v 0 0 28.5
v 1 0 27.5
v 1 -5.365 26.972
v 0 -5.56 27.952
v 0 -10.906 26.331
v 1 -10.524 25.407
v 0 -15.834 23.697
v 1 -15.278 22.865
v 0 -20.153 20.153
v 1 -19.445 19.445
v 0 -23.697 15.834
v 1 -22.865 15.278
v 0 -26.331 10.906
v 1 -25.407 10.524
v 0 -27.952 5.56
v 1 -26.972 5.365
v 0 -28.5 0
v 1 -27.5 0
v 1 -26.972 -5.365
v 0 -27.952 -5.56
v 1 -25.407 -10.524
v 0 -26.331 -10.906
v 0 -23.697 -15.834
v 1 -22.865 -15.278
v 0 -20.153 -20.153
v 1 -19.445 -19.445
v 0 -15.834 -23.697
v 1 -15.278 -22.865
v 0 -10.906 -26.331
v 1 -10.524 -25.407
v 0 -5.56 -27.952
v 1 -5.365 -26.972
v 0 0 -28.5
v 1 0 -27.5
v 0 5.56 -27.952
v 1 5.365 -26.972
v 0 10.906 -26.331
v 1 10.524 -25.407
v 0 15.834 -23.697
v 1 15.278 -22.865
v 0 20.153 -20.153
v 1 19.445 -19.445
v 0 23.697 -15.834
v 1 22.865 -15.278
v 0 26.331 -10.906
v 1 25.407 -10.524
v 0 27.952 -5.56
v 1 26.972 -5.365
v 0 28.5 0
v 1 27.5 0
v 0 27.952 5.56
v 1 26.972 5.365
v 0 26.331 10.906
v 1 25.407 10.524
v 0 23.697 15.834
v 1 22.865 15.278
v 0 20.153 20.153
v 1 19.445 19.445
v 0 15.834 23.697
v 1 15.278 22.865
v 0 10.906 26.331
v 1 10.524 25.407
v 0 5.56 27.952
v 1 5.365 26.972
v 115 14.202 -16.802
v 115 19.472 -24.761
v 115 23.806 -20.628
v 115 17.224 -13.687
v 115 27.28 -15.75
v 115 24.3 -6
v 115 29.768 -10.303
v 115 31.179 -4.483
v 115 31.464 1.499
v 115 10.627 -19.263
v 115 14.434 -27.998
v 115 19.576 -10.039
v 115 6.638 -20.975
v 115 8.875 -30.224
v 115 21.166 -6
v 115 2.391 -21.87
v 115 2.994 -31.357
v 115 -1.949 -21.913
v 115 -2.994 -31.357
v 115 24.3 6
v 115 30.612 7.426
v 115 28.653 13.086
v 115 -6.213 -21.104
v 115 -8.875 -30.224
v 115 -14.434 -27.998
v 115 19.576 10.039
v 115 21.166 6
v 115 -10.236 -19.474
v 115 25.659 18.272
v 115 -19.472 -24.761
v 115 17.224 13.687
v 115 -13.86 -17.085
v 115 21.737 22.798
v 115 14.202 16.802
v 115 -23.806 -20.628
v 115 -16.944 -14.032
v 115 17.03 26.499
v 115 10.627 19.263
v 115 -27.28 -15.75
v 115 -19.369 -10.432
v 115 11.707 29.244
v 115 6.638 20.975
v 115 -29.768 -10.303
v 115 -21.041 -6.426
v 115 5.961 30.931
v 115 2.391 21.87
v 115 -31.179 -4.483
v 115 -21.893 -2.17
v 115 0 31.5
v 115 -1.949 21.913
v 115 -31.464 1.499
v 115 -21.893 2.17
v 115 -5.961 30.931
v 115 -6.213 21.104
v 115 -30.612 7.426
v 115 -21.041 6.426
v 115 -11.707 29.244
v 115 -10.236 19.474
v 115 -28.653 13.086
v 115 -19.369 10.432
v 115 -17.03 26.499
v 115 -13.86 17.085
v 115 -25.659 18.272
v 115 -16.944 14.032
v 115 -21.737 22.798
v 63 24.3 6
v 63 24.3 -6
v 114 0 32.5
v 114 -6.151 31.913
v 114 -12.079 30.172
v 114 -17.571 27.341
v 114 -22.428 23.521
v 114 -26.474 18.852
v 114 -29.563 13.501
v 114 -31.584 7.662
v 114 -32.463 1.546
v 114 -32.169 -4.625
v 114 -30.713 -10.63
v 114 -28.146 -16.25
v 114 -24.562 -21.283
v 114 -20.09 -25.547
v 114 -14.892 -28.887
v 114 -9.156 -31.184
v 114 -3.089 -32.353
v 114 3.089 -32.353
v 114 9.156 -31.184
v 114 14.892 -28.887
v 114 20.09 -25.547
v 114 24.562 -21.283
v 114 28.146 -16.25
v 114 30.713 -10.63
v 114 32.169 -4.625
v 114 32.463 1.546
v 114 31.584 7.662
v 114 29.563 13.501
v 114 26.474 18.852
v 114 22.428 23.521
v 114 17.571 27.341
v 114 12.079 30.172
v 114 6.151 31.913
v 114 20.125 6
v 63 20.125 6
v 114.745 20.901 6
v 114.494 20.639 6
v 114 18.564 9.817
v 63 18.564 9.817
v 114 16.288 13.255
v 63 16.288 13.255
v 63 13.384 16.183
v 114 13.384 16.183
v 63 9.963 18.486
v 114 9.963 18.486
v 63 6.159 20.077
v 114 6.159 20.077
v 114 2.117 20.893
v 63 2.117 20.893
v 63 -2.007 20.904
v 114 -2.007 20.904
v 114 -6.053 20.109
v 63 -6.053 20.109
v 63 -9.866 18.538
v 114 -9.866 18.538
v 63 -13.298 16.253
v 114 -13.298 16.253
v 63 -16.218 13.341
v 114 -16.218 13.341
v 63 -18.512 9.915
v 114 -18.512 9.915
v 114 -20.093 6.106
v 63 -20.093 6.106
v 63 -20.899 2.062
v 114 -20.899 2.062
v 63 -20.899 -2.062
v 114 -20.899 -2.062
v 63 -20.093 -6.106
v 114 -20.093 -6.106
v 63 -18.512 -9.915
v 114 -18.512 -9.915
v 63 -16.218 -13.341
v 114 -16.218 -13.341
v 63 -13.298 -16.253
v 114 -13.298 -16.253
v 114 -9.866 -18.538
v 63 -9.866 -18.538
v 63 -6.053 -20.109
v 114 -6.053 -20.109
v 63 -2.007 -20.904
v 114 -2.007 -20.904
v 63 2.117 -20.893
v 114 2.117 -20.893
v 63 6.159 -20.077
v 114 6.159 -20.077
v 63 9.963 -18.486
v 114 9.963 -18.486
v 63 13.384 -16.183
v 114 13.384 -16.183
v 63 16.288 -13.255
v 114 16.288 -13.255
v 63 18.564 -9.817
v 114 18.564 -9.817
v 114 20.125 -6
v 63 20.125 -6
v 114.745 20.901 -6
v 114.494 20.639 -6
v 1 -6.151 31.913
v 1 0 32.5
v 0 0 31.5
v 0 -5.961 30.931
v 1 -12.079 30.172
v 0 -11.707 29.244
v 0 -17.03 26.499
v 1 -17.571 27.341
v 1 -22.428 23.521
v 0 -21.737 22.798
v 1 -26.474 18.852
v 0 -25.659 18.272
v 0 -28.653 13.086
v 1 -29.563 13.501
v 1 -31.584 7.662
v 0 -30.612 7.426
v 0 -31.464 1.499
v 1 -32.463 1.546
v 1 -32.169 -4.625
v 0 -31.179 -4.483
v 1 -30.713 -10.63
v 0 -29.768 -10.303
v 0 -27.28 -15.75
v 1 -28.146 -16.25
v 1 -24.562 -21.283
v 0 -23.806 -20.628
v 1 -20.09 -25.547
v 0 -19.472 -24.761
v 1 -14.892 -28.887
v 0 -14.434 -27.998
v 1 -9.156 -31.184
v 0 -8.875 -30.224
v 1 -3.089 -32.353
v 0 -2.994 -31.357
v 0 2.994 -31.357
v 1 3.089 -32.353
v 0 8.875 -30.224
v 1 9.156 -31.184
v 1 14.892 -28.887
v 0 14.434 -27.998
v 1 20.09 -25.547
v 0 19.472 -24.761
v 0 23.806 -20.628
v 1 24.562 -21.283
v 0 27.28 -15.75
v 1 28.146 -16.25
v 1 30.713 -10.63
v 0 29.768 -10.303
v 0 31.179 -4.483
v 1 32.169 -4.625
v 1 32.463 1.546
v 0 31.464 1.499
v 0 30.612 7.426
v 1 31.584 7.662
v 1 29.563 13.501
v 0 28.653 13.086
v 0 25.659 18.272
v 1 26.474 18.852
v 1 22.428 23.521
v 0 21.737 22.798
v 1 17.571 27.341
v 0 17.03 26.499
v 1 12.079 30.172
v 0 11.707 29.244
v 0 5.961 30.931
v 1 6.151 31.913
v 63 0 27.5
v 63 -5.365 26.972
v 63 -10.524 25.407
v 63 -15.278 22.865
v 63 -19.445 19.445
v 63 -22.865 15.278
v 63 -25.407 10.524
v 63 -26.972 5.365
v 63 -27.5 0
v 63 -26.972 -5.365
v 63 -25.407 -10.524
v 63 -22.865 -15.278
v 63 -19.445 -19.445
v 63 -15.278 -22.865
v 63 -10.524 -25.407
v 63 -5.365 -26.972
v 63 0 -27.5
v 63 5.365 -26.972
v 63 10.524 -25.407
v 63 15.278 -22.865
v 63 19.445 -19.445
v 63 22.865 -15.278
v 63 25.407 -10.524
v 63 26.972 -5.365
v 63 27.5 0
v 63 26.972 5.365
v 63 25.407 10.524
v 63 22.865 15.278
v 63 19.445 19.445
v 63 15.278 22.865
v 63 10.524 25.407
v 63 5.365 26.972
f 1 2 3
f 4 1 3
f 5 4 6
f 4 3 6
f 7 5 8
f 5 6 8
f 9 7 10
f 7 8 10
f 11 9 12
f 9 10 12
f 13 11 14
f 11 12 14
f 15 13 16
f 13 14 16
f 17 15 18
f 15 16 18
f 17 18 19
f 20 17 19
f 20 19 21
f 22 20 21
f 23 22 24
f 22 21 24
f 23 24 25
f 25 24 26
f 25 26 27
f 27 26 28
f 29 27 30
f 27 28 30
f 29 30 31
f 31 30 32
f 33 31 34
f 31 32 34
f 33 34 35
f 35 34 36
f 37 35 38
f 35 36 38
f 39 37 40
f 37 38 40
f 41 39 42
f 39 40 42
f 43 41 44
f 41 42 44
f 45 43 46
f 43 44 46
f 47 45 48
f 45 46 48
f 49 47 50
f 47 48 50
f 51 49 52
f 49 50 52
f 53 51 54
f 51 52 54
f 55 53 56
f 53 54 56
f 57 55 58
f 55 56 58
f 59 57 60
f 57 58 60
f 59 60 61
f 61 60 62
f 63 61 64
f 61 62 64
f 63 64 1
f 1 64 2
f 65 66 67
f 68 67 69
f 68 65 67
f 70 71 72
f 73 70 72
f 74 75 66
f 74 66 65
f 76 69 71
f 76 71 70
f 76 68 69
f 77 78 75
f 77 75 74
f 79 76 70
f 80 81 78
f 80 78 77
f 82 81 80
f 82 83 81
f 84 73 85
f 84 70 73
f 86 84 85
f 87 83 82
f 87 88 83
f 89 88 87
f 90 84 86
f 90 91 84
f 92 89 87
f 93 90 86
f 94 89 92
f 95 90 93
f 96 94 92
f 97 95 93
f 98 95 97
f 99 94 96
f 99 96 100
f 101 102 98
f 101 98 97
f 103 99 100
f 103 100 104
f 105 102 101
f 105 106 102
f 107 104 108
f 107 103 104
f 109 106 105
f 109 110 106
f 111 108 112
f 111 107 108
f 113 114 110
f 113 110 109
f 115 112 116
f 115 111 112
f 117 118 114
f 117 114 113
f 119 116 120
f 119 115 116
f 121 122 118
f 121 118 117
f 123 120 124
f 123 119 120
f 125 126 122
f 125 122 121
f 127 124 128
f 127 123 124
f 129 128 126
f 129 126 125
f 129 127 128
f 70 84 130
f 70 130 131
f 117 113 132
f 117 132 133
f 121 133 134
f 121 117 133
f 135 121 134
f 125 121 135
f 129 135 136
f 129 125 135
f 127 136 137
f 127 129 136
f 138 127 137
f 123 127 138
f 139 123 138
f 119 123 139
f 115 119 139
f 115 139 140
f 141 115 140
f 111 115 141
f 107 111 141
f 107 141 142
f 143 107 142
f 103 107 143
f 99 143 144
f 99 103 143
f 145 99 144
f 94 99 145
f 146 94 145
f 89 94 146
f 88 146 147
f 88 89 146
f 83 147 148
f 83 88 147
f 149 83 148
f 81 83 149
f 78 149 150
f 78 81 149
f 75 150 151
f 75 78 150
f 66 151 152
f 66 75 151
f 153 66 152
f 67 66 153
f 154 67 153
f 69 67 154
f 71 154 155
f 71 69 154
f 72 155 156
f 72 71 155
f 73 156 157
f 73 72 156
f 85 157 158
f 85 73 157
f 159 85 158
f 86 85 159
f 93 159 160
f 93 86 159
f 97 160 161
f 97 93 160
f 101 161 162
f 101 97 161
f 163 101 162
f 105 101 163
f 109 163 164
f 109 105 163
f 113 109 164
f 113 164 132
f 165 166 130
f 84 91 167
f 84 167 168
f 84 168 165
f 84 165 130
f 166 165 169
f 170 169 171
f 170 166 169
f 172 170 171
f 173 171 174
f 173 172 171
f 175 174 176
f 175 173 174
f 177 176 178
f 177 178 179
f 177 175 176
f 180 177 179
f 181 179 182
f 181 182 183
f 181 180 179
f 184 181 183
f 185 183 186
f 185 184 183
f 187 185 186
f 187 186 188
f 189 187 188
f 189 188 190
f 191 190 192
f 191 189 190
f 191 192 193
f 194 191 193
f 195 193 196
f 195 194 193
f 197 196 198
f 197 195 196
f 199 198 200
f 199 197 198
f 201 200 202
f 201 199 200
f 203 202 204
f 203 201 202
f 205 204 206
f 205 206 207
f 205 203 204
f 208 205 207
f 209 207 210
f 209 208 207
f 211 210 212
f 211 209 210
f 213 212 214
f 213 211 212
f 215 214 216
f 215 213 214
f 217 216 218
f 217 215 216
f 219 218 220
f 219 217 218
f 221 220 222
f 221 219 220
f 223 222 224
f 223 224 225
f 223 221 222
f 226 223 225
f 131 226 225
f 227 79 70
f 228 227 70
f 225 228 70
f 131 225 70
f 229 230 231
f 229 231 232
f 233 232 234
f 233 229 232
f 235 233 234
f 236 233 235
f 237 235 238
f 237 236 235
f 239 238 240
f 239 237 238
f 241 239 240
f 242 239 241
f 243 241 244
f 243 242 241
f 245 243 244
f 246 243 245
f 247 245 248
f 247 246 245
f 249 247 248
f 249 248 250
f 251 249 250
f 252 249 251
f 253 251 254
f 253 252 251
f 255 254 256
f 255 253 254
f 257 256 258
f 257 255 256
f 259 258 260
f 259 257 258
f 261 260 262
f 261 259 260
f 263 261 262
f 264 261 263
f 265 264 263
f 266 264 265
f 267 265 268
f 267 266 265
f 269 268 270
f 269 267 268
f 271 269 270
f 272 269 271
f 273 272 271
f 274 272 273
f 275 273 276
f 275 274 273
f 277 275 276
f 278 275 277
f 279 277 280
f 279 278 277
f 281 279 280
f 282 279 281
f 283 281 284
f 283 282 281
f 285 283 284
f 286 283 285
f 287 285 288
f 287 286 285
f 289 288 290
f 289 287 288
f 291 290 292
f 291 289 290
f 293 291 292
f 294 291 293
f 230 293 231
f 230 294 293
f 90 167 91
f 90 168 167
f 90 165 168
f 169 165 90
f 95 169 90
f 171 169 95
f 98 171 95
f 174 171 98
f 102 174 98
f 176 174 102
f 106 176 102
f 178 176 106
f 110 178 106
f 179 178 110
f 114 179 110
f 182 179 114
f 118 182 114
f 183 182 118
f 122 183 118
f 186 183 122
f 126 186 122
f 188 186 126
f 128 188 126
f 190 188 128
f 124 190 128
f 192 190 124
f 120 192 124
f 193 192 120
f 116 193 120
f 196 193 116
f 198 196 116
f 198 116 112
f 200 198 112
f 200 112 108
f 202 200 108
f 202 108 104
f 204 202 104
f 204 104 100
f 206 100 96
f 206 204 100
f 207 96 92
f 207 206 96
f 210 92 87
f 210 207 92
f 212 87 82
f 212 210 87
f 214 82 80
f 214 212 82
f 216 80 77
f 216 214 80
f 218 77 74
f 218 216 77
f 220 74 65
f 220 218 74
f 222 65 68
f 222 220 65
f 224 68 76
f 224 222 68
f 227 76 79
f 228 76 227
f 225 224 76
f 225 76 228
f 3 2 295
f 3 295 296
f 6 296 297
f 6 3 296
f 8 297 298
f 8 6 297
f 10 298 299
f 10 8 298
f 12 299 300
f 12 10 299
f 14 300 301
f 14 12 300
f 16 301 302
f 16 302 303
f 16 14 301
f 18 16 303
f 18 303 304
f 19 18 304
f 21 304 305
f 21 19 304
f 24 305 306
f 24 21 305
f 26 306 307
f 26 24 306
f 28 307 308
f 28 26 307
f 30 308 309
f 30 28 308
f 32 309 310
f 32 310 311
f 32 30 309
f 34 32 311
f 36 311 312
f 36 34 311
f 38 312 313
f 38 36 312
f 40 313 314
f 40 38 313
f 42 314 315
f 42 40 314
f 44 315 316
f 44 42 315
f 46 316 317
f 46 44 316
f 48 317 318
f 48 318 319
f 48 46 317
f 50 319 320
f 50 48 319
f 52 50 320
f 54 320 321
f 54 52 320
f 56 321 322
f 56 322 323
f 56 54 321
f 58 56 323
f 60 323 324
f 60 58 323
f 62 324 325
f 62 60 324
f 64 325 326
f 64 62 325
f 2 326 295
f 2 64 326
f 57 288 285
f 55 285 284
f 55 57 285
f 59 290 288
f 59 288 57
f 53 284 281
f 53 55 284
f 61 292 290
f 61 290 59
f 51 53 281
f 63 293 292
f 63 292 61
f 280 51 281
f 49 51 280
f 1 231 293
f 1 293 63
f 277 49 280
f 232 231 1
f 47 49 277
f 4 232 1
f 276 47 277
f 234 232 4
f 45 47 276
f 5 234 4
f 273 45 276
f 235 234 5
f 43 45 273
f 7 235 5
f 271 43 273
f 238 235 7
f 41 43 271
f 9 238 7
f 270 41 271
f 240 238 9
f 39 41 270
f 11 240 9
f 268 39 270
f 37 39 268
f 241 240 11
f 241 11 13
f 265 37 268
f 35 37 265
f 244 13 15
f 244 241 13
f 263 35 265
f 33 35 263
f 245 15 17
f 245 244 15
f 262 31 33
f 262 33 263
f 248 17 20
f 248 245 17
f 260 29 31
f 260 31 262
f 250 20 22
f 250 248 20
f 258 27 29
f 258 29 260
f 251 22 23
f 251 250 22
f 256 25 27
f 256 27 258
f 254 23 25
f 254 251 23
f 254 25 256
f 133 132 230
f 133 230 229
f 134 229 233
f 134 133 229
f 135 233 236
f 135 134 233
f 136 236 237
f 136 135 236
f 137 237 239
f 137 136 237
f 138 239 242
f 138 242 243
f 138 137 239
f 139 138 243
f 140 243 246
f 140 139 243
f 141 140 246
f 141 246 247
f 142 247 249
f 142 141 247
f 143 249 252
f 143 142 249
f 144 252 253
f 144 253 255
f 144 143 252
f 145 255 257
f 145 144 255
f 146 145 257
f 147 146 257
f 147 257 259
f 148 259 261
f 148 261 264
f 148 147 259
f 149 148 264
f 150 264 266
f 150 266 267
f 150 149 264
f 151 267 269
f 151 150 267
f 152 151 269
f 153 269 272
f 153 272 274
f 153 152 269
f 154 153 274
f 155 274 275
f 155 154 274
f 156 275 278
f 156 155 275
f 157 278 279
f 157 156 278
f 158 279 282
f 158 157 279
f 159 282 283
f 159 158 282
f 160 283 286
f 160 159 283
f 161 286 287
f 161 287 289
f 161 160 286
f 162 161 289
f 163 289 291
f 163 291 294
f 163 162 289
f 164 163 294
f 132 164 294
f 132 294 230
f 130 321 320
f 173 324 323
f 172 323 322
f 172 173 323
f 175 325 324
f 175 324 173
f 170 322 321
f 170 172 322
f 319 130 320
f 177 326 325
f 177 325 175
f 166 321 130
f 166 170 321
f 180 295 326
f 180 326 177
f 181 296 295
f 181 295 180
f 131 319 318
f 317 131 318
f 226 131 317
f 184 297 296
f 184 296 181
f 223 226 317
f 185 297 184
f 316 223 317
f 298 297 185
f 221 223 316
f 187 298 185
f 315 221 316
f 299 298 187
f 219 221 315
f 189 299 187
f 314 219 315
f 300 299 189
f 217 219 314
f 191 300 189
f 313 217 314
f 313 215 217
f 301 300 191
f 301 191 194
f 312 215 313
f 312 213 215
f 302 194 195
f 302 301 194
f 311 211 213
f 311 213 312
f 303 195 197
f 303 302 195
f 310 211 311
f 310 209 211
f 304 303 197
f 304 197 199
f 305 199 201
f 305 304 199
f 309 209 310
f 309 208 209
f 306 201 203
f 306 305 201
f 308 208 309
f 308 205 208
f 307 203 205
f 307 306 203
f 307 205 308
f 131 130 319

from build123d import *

# Parameters (mm, degrees)
CHAMFER1_SIZE      = 1
SKETCH2_W          = 12
SKETCH2_H          = 8.3
CUT_EXTRUDE1_DEPTH = 100


with BuildPart() as part:
    # Sketch1 → Revolve1 (revolve)
    with BuildSketch(Plane.XY, mode=Mode.PRIVATE) as revolve1_sk:
        Polygon((0, 27.5), (0, 32.5), (115, 32.5), (115, 21), (63, 21), (63, 27.5), align=None)
    revolve(revolve1_sk.sketch.rotate(Axis((0, 0, 0), (1, 0, 0)), 90), axis=Axis((0, 0, 0), (1, 0, 0)))

    # Chamfer1
    chamfer1_edges = [part.edges().sort_by_distance(p)[0] for p in [
        (115, 0, -21),
        (115, 0, -32.5),
        (0, 0, -32.5),
        (0, 0, -27.5),
    ]]
    chamfer(chamfer1_edges, length=CHAMFER1_SIZE)

    # Sketch2 → Cut-Extrude1 (cut)
    with BuildSketch(Plane(origin=(115, 0, 0), x_dir=(0, 0, -1), z_dir=(1, 0, 0))):
        with Locations((0, 20.15)):
            Rectangle(SKETCH2_W, SKETCH2_H)
    extrude(amount=-CUT_EXTRUDE1_DEPTH, mode=Mode.SUBTRACT)


solid = part.part
